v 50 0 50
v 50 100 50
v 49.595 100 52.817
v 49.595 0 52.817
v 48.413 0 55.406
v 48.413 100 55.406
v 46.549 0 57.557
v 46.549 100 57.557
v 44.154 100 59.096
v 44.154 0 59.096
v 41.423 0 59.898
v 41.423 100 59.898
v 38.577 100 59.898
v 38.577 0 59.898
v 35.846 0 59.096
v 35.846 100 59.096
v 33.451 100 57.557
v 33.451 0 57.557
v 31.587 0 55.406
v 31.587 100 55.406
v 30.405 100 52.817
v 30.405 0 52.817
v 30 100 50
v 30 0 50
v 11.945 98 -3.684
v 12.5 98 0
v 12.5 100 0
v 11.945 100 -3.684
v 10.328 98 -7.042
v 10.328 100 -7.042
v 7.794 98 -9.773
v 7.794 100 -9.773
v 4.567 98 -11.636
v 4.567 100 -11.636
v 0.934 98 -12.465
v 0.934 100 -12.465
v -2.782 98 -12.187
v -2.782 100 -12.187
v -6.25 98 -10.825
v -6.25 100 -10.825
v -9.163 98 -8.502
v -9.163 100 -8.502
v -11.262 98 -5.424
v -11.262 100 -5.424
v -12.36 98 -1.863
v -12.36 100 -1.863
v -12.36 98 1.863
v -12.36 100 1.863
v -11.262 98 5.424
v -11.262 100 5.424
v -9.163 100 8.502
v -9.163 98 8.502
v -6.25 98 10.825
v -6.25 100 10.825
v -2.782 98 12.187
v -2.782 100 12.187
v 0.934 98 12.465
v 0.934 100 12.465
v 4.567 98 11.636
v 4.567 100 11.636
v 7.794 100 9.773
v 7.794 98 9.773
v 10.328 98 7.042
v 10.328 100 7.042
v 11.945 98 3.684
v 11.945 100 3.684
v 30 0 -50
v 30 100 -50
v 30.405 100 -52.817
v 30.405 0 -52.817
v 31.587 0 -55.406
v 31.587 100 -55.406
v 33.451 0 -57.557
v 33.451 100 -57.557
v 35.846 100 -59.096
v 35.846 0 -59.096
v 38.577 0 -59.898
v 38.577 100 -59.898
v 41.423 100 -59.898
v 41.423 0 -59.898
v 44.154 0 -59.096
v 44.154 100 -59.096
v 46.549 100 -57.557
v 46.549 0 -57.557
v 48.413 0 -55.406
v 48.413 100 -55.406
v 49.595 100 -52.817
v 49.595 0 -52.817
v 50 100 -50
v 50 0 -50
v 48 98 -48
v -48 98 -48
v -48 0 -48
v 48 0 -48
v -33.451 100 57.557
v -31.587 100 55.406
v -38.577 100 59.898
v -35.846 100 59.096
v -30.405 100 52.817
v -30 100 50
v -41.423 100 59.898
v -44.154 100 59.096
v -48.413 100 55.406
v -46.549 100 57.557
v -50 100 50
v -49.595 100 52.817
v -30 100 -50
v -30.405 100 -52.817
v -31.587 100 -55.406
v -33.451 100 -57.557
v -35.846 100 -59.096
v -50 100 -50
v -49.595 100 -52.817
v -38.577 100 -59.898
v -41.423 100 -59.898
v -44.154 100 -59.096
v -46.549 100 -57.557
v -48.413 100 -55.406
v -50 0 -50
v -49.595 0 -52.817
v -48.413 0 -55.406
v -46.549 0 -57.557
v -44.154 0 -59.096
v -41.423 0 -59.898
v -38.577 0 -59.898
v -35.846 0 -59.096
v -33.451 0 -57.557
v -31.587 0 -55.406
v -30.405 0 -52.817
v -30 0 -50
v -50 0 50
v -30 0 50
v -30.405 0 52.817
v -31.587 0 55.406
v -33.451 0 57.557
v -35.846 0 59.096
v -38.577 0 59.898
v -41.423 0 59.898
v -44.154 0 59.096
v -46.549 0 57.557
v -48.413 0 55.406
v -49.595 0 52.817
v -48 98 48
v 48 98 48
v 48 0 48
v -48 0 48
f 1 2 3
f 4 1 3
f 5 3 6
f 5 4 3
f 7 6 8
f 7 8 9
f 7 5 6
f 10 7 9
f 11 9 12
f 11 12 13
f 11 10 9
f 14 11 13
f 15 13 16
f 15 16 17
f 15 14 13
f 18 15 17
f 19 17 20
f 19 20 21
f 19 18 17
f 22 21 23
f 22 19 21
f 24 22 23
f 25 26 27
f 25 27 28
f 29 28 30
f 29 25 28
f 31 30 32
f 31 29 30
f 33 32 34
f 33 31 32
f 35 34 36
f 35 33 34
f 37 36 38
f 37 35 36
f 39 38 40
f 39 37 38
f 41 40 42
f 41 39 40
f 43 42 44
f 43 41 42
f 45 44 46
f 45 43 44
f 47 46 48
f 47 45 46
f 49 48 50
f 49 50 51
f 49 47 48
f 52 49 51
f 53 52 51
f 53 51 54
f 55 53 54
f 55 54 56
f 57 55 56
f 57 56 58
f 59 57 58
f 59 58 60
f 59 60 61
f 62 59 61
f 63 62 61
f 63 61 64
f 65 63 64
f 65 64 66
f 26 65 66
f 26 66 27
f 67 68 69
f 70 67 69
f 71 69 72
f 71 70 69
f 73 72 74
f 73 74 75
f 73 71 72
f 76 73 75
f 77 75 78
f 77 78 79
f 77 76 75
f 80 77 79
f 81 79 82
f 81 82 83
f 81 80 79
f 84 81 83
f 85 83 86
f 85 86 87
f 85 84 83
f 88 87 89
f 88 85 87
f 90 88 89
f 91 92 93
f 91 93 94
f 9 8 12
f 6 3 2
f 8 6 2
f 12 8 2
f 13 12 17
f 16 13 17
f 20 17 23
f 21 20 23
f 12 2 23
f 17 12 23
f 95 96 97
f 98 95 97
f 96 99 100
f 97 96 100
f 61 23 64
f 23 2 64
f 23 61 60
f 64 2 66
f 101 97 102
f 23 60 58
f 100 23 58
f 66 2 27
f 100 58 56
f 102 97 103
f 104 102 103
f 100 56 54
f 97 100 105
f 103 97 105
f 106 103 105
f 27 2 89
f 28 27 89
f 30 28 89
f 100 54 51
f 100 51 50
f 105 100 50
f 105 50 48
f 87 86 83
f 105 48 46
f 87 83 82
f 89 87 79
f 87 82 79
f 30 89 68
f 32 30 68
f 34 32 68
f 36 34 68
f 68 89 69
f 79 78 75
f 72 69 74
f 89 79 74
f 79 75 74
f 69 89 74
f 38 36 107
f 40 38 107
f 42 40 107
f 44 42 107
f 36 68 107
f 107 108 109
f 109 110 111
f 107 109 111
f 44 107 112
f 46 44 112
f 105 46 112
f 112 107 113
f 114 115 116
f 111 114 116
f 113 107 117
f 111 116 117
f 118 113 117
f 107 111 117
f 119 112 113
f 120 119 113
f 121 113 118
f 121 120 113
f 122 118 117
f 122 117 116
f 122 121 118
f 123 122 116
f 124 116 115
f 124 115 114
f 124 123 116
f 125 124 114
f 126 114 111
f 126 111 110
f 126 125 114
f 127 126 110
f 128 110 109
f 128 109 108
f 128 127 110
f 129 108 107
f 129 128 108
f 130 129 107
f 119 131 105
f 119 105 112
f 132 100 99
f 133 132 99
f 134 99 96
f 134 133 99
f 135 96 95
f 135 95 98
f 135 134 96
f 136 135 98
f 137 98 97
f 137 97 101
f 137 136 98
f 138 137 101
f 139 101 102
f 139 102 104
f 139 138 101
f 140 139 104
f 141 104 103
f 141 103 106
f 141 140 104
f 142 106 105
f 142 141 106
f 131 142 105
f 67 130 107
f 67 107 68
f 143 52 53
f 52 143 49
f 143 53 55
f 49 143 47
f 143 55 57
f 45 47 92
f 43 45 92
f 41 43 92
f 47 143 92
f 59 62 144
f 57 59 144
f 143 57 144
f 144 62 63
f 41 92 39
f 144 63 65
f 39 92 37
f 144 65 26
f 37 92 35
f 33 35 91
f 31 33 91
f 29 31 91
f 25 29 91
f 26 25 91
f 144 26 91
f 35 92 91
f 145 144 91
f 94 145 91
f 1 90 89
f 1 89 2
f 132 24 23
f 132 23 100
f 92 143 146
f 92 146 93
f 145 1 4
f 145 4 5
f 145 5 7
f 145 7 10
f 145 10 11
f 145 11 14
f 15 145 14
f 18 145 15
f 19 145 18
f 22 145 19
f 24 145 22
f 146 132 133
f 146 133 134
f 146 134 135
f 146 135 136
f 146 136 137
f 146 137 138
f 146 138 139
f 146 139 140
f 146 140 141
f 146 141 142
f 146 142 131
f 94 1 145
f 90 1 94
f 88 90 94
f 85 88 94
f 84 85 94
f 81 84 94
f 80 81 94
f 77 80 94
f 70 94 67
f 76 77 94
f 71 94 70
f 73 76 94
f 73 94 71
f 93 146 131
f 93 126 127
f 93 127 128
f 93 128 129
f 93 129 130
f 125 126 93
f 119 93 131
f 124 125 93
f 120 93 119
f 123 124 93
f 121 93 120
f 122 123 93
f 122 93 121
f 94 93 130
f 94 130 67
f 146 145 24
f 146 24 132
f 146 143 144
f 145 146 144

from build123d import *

# Parameters (mm, degrees)
SKETCH1_R           = 12.5
BOSS_EXTRUDE1_DEPTH = 100
SKETCH2_W           = 96
SKETCH2_H           = 96
CUT_EXTRUDE1_DEPTH  = 150


with BuildPart() as part:
    # Sketch1 → Boss-Extrude1 (new body)
    with BuildSketch(Plane(origin=(0, 0, 0), x_dir=(1, 0, 0), z_dir=(0, 1, 0))):
        with BuildLine():
            Line((-30, 50), (30, 50))
            ThreePointArc((30, 50), (40, 60), (50, 50))
            Line((50, 50), (50, -50))
            ThreePointArc((50, -50), (40, -60), (30, -50))
            Line((30, -50), (-30, -50))
            ThreePointArc((-30, -50), (-40, -60), (-50, -50))
            Line((-50, -50), (-50, 50))
            ThreePointArc((-50, 50), (-40, 60), (-30, 50))
        make_face()
        Circle(SKETCH1_R, mode=Mode.SUBTRACT)
    extrude(amount=BOSS_EXTRUDE1_DEPTH)

    # Sketch2 → Cut-Extrude1 (cut)
    with BuildSketch(Plane(origin=(0, 98, 0), x_dir=(1, 0, 0), z_dir=(0, 1, 0))):
        Rectangle(SKETCH2_W, SKETCH2_H)
    extrude(amount=-CUT_EXTRUDE1_DEPTH, mode=Mode.SUBTRACT)


solid = part.part
